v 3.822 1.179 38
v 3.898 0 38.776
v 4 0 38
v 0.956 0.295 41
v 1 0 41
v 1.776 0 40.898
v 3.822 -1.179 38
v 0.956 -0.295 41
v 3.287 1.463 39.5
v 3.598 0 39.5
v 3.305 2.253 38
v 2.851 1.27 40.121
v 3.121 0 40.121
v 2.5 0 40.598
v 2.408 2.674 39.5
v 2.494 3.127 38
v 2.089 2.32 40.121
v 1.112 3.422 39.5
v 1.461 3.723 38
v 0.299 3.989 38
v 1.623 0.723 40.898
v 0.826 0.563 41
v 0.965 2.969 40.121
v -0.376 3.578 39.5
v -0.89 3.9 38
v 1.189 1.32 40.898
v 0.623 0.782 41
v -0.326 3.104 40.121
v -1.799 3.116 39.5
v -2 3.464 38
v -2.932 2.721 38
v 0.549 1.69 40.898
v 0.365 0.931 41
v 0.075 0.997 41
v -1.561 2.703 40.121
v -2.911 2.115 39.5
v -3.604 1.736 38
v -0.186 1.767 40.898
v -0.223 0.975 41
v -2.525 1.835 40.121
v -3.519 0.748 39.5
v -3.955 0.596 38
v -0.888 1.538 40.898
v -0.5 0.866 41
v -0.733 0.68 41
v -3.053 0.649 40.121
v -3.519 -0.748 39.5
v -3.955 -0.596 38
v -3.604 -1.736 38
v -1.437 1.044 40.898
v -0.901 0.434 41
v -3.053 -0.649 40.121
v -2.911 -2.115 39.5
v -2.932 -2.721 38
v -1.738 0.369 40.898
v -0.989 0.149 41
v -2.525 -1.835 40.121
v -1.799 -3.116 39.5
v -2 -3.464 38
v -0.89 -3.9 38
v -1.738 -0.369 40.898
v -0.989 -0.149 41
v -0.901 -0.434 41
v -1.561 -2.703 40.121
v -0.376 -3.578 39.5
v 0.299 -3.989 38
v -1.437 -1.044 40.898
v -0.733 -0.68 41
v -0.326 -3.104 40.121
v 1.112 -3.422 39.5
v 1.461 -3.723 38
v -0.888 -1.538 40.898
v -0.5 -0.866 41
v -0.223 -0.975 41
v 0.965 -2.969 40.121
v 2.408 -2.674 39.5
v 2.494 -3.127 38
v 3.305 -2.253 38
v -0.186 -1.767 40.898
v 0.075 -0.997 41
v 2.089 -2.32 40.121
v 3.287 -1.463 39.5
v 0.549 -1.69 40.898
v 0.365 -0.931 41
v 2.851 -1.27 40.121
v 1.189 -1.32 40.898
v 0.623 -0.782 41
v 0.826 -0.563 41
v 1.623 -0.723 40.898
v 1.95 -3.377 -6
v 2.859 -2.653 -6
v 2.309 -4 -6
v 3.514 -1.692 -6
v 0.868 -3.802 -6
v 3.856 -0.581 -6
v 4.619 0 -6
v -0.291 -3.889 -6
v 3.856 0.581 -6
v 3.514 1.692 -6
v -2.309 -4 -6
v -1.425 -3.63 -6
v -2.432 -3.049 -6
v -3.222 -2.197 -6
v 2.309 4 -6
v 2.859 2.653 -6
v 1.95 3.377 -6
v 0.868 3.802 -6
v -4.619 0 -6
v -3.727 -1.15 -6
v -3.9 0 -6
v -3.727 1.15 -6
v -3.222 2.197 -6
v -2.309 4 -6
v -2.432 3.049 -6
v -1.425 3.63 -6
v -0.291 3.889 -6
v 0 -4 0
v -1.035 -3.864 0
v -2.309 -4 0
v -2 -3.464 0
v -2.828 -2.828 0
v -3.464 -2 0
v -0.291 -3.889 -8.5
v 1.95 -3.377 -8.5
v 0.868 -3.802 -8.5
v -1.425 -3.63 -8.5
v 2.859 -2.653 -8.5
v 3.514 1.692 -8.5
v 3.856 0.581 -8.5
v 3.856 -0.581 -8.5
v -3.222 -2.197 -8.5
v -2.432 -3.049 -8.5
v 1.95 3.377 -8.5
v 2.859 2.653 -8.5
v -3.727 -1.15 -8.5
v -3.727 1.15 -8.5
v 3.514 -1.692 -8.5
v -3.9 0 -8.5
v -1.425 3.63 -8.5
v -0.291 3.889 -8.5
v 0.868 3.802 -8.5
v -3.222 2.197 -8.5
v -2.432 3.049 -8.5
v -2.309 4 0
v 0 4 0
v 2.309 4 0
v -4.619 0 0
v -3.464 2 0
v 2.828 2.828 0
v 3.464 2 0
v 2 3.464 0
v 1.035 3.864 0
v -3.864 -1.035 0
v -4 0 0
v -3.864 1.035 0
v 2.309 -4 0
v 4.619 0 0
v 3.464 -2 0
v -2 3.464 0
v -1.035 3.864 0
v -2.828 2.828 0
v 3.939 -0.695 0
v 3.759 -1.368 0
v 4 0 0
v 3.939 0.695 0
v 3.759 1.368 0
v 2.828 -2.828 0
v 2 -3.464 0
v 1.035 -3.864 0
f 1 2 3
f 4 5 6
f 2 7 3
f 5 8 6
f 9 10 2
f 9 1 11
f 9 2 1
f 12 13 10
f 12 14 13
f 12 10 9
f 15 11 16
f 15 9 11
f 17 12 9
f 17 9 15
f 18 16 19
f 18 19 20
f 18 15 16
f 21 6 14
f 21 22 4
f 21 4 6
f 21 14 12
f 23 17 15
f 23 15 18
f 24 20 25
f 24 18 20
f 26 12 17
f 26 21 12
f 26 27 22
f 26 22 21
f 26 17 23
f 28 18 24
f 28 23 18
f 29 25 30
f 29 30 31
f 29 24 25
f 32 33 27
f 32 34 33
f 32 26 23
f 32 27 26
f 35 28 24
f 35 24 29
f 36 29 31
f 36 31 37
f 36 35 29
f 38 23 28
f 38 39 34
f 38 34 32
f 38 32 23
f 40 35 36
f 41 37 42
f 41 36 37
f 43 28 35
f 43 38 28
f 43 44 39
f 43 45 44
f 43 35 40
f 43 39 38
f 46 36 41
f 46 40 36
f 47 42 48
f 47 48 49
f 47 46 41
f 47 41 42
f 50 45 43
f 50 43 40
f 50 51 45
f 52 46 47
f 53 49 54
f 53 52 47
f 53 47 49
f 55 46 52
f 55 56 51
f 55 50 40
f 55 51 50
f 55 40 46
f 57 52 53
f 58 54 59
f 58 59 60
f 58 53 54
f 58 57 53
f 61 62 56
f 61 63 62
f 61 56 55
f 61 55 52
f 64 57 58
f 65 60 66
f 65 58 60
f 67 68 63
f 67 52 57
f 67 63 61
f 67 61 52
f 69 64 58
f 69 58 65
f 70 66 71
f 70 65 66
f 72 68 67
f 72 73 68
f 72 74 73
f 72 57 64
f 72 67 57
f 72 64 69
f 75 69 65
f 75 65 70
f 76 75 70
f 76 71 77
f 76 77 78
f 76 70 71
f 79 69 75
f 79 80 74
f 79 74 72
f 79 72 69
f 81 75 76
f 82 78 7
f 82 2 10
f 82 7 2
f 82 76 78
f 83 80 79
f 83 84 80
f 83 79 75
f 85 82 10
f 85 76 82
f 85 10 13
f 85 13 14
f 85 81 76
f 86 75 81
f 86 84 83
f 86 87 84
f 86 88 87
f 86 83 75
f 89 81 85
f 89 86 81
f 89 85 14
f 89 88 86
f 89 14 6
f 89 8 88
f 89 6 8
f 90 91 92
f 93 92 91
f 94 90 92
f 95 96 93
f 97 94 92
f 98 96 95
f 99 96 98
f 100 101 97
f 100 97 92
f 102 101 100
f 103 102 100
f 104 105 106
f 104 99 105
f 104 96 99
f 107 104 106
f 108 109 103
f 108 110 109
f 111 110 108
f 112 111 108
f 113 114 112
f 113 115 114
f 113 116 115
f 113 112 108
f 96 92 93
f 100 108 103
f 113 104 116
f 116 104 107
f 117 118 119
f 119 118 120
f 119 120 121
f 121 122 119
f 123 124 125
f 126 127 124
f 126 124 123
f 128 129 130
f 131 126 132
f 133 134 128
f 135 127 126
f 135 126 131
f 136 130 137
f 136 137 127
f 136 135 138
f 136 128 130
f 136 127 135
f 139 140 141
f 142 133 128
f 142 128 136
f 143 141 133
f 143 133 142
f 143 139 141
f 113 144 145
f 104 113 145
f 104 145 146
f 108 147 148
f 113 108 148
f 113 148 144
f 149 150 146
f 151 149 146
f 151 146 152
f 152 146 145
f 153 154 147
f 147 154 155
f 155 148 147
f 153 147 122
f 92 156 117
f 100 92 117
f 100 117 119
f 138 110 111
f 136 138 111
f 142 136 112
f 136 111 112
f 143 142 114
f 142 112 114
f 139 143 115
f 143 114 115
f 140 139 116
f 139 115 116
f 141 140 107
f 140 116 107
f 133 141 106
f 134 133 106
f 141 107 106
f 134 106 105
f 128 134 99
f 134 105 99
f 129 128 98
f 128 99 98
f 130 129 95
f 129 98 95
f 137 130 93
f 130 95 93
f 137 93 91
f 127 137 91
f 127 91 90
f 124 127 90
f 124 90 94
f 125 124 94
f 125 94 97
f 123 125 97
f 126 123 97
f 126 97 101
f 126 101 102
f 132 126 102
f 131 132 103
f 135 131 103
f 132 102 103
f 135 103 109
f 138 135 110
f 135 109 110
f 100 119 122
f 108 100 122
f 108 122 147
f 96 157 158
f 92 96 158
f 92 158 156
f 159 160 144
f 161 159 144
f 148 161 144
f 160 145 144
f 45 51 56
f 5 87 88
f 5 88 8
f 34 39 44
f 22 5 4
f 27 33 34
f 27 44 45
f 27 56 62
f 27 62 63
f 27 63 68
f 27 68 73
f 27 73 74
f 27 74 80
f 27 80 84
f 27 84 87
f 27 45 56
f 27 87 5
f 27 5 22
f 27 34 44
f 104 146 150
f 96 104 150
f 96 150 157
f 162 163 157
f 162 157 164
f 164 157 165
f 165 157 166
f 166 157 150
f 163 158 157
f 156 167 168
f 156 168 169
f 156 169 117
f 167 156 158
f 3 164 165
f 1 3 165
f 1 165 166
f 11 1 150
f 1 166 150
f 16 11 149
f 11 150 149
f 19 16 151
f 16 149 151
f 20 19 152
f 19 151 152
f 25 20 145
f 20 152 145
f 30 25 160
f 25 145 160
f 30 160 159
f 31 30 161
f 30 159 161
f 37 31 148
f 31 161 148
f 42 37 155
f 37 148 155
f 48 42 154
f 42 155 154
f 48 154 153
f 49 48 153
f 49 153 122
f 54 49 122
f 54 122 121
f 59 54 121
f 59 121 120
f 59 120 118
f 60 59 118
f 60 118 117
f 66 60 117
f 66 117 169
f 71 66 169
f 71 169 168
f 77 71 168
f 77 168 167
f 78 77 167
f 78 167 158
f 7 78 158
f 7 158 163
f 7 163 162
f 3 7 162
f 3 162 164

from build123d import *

# Parameters (mm, degrees)
CROQUIS1_R              = 4
SALIENTE_EXTRUIR1_DEPTH = 41
SALIENTE_EXTRUIR2_DEPTH = 6
CROQUIS3_R              = 3.9
SALIENTE_EXTRUIR3_DEPTH = 2.5
REDONDEO1_R             = 3


with BuildPart() as part:
    # Croquis1 → Saliente-Extruir1 (new body)
    with BuildSketch(Plane.XY):
        Circle(CROQUIS1_R)
    extrude(amount=SALIENTE_EXTRUIR1_DEPTH)

    # Croquis2 → Saliente-Extruir2 (add)
    with BuildSketch(Plane(origin=(0, 0, 0), x_dir=(-1, 0, 0), z_dir=(0, 0, -1))):
        Polygon((-2.309401077, 4), (-4.618802154, 0), (-2.309401077, -4), (2.309401077, -4), (4.618802154, 0), (2.309401077, 4), align=None)
    extrude(amount=SALIENTE_EXTRUIR2_DEPTH)

    # Croquis3 → Saliente-Extruir3 (add)
    with BuildSketch(Plane(origin=(0, 0, -6), x_dir=(-1, 0, 0), z_dir=(0, 0, -1))):
        Circle(CROQUIS3_R)
    extrude(amount=SALIENTE_EXTRUIR3_DEPTH)

    # Redondeo1
    redondeo1_edges = [part.edges().sort_by_distance(p)[0] for p in [
        (-4, 0, 41),
    ]]
    fillet(redondeo1_edges, radius=REDONDEO1_R)


solid = part.part
